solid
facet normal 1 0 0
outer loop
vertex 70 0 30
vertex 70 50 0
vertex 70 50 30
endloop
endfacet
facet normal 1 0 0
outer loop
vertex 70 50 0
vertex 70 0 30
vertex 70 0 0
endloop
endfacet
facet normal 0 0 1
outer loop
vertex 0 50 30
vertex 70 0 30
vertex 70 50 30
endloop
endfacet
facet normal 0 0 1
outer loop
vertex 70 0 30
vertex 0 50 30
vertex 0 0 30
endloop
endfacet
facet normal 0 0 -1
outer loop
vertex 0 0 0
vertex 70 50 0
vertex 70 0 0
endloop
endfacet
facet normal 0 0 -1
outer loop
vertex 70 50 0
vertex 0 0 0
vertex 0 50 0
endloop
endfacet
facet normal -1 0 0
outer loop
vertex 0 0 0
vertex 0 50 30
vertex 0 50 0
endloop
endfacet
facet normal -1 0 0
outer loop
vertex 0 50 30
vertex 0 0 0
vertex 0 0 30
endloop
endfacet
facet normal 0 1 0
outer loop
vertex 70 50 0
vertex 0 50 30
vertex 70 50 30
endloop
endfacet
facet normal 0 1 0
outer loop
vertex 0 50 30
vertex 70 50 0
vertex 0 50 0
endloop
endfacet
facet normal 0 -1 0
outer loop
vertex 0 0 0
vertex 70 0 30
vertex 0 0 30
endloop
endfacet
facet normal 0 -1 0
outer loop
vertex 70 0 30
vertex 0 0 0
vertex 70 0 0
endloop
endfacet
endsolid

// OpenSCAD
// Dimensions in mm
box_width = 70;
box_height = 50;
box_depth = 30;
lid_wall_thickness = 1.5;
lip_outer_size_x = 65.6;
lip_outer_size_y = 45.6;
lip_clearance = 0.2;

// Box
difference() {
    cube([box_width, box_height, box_depth]);
    
    translate([-1, -1, box_height])
        cube([box_width + 2, box_height + 2, lid_wall_thickness]);
}

// Lid
translate([0, 0, -lid_wall_thickness])
    difference() {
        cube([lip_outer_size_x, lip_outer_size_y, box_depth]);
        
        translate([-lip_clearance/2, -lip_clearance/2, 0])
            cube([lip_outer_size_x + lip_clearance*2, lip_outer_size_y + lip_clearance*2, lid_wall_thickness]);
    }
    
// Gap between parts
translate([box_width/2 - lid_wall_thickness/2, 0, box_depth])
    linear_extrude(box_depth)
        cube([10, box_height, box_depth], center=true);
